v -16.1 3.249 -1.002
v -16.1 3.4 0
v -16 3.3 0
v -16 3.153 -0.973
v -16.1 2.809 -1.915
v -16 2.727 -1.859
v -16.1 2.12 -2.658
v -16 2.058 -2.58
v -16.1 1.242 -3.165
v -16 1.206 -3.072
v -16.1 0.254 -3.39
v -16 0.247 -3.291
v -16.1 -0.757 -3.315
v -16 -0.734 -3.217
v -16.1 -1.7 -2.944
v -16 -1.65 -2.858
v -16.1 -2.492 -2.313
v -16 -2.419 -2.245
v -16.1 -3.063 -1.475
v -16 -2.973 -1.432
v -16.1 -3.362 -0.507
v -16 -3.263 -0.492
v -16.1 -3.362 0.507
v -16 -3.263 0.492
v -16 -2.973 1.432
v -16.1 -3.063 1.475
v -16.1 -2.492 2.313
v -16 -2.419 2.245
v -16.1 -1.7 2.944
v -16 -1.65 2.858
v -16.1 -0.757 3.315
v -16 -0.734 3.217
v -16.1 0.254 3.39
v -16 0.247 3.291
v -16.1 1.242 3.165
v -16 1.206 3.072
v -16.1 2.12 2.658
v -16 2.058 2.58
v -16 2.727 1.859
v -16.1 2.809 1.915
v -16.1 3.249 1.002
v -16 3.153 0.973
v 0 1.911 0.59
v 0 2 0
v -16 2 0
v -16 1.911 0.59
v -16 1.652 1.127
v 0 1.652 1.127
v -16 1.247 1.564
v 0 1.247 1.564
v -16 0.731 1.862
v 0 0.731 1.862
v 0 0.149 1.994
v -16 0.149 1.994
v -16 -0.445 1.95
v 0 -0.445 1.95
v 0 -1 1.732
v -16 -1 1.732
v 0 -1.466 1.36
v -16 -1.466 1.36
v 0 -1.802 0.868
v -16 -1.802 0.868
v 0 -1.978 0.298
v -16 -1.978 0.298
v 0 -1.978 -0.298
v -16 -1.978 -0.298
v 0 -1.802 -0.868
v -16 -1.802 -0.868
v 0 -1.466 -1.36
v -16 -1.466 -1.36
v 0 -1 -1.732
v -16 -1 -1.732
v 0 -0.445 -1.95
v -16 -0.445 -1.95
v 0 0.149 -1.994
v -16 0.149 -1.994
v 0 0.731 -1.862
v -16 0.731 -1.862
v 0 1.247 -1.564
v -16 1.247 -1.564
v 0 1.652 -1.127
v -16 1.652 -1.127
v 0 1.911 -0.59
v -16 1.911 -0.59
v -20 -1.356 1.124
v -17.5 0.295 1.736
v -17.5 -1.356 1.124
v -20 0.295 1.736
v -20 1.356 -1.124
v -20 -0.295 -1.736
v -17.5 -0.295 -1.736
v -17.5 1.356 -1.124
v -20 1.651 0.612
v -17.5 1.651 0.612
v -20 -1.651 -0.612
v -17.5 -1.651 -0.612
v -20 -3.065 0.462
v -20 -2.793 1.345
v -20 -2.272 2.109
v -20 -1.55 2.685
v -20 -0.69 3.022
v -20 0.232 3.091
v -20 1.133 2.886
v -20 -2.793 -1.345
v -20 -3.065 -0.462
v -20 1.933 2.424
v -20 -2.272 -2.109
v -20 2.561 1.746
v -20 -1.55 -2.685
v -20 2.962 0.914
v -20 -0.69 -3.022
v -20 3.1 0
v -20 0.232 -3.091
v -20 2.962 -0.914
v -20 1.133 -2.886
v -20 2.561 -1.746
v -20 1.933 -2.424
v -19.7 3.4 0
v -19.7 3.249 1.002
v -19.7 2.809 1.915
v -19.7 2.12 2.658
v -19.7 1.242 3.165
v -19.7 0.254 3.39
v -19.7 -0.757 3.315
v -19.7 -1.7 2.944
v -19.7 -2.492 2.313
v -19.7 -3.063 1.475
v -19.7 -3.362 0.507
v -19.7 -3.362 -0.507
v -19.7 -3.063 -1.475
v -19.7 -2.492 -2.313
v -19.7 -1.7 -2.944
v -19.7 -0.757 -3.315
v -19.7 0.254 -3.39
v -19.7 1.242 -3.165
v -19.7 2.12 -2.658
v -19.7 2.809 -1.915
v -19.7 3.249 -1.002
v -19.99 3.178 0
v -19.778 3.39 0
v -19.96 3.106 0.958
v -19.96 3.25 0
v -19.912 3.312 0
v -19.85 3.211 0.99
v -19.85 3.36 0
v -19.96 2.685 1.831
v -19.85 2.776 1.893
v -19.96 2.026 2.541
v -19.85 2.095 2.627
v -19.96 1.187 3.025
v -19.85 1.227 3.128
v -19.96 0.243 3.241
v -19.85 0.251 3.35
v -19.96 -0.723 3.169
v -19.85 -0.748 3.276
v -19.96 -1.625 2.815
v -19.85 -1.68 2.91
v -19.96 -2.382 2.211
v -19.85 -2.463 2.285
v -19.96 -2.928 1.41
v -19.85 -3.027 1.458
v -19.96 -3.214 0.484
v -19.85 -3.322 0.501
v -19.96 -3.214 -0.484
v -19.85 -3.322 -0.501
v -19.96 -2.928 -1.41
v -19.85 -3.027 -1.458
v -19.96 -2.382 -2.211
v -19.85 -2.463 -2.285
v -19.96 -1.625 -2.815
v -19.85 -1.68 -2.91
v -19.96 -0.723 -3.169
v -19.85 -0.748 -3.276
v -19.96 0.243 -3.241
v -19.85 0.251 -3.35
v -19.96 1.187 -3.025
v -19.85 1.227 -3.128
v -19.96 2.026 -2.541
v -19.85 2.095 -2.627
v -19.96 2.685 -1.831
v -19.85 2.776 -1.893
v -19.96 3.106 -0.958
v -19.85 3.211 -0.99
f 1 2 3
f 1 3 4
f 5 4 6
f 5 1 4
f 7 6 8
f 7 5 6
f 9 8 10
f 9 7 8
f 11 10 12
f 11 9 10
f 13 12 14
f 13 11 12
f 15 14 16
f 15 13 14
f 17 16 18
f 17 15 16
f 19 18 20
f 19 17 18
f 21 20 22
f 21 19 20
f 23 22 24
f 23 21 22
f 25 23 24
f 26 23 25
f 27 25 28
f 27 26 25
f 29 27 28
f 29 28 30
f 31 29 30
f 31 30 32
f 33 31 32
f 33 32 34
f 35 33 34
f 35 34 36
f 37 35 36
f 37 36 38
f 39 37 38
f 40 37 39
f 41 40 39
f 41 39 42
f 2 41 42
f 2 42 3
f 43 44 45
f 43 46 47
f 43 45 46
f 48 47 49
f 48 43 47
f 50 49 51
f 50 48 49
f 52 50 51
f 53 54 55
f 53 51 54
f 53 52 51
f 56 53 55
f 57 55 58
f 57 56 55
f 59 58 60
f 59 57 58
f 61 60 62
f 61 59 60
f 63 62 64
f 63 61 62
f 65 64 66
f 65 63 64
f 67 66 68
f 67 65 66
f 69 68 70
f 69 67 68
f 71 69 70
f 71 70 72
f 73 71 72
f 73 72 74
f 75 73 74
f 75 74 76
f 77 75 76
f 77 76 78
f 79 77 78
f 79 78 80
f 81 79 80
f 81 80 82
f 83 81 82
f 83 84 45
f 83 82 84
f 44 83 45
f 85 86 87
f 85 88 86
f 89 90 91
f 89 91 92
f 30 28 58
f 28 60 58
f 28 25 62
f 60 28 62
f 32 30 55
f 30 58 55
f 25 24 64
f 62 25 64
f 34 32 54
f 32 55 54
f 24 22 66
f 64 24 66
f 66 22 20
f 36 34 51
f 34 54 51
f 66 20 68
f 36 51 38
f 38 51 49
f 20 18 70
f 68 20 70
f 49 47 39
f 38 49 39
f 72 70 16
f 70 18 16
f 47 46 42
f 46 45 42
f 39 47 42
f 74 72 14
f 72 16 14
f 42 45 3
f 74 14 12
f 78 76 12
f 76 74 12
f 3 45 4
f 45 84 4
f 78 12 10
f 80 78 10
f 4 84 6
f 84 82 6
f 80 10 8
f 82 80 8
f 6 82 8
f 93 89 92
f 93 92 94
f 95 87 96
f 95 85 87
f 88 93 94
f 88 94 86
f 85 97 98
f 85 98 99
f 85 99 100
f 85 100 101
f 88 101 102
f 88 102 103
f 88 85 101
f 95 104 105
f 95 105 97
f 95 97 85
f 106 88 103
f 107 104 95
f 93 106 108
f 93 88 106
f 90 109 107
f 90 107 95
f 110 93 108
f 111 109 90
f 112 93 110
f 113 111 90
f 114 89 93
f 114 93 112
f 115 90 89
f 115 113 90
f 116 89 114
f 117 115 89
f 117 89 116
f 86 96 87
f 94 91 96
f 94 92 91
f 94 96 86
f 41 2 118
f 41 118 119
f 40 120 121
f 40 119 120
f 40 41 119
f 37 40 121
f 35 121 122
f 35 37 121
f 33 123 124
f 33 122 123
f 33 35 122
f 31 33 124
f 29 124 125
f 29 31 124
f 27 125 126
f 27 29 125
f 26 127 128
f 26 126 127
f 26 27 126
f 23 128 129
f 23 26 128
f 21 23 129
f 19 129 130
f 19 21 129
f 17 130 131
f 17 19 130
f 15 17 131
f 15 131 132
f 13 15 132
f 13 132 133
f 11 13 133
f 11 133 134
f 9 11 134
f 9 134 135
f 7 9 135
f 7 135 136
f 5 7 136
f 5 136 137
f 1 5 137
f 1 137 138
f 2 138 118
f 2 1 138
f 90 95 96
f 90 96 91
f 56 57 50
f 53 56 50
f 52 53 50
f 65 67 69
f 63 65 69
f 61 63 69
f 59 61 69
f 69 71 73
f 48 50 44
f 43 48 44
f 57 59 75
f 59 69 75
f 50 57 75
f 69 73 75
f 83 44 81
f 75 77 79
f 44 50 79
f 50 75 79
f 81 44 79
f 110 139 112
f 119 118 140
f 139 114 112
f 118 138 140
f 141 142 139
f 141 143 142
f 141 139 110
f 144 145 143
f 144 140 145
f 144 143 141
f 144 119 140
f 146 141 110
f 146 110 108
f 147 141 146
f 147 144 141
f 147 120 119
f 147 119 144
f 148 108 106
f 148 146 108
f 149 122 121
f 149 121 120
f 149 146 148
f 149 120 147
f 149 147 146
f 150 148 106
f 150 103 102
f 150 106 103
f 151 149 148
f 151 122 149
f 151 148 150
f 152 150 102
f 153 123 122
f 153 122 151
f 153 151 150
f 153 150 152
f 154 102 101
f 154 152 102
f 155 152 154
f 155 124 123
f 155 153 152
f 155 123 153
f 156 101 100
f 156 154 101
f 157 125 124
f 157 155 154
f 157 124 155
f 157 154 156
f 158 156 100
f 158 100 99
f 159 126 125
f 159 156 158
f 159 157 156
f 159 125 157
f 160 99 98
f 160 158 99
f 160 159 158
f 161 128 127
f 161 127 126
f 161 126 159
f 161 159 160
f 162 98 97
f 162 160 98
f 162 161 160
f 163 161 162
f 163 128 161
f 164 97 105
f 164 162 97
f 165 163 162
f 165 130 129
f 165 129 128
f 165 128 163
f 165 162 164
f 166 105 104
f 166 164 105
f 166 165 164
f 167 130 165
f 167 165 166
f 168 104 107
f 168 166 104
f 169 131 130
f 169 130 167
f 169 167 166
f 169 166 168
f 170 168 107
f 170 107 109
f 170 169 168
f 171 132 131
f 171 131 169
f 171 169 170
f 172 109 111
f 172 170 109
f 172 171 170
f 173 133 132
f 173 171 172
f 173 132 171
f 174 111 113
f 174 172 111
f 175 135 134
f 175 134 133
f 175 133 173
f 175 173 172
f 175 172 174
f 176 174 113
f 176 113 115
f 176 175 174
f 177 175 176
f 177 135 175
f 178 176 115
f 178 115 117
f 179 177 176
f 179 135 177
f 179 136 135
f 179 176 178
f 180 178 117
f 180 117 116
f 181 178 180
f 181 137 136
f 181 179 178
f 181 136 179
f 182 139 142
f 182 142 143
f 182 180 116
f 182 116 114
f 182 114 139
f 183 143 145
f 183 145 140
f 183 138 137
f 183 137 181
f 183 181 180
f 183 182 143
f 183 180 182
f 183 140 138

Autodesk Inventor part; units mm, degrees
ref_plane "YZ Plane" through (0, 0, 0) normal (1, 0, 0) x (0, 1, 0)
ref_plane "XZ Plane" through (0, 0, 0) normal (0, 1, 0) x (-1, 0, 0)
ref_plane "XY Plane" through (0, 0, 0) normal (0, 0, 1) x (1, 0, 0)
sketch "Sketch1" plane through (0, 0, 0) normal (0, 0, 1) x (1, 0, 0)
  line L0 (0, 0) -> (-20, 0)
  line L1 (-20, 0) -> (-20, 3.4)
  line L2 (-20, 3.4) -> (-16, 3.4)
  line L3 (-16, 3.4) -> (-16, 2)
  line L4 (-16, 2) -> (0, 2)
  line L5 (0, 2) -> (0, 0)
  dimension "d0" = 4
  dimension "d1" = 2
  dimension "d2" = 20
  dimension "d3" = 3.4
revolve "Revolution1" add sketch "Sketch1" angle 360 about axis through (0, 0, 0) along (-1, 0, 0)
fillet "Fillet1" radius 0.3 1 edges at (-20, -3.4, 0)
chamfer "Chamfer1" distance 0.1 angle 45 1 edges at (-16, -3.4, 0)
thread "Thread1" size "M4x0.7" class "6g" standard "ANSI Metric M Profile" full length
sketch "Sketch2" plane through (-20, 0, 0) normal (-1, 0, 0) x (0, 0, 1)
  line L0 (-1.1237, 1.3558) -> (0.6123, 1.651)
  line L1 (0.6123, 1.651) -> (1.736, 0.2952)
  line L2 (1.736, 0.2952) -> (1.1237, -1.3558)
  line L3 (1.1237, -1.3558) -> (-0.6123, -1.651)
  line L4 (-0.6123, -1.651) -> (-1.736, -0.2952)
  line L5 (-1.736, -0.2952) -> (-1.1237, 1.3558)
  point P0 (0, 0)
  point P1 (0, 0)
  dimension "d11" = 3.05
extrude "Extrusion1" cut sketch "Sketch2" against normal blind 2.5
properties part number "Screw_StainlessSteal_M4_SocketCap_20mm" material "Stainless Steel"
